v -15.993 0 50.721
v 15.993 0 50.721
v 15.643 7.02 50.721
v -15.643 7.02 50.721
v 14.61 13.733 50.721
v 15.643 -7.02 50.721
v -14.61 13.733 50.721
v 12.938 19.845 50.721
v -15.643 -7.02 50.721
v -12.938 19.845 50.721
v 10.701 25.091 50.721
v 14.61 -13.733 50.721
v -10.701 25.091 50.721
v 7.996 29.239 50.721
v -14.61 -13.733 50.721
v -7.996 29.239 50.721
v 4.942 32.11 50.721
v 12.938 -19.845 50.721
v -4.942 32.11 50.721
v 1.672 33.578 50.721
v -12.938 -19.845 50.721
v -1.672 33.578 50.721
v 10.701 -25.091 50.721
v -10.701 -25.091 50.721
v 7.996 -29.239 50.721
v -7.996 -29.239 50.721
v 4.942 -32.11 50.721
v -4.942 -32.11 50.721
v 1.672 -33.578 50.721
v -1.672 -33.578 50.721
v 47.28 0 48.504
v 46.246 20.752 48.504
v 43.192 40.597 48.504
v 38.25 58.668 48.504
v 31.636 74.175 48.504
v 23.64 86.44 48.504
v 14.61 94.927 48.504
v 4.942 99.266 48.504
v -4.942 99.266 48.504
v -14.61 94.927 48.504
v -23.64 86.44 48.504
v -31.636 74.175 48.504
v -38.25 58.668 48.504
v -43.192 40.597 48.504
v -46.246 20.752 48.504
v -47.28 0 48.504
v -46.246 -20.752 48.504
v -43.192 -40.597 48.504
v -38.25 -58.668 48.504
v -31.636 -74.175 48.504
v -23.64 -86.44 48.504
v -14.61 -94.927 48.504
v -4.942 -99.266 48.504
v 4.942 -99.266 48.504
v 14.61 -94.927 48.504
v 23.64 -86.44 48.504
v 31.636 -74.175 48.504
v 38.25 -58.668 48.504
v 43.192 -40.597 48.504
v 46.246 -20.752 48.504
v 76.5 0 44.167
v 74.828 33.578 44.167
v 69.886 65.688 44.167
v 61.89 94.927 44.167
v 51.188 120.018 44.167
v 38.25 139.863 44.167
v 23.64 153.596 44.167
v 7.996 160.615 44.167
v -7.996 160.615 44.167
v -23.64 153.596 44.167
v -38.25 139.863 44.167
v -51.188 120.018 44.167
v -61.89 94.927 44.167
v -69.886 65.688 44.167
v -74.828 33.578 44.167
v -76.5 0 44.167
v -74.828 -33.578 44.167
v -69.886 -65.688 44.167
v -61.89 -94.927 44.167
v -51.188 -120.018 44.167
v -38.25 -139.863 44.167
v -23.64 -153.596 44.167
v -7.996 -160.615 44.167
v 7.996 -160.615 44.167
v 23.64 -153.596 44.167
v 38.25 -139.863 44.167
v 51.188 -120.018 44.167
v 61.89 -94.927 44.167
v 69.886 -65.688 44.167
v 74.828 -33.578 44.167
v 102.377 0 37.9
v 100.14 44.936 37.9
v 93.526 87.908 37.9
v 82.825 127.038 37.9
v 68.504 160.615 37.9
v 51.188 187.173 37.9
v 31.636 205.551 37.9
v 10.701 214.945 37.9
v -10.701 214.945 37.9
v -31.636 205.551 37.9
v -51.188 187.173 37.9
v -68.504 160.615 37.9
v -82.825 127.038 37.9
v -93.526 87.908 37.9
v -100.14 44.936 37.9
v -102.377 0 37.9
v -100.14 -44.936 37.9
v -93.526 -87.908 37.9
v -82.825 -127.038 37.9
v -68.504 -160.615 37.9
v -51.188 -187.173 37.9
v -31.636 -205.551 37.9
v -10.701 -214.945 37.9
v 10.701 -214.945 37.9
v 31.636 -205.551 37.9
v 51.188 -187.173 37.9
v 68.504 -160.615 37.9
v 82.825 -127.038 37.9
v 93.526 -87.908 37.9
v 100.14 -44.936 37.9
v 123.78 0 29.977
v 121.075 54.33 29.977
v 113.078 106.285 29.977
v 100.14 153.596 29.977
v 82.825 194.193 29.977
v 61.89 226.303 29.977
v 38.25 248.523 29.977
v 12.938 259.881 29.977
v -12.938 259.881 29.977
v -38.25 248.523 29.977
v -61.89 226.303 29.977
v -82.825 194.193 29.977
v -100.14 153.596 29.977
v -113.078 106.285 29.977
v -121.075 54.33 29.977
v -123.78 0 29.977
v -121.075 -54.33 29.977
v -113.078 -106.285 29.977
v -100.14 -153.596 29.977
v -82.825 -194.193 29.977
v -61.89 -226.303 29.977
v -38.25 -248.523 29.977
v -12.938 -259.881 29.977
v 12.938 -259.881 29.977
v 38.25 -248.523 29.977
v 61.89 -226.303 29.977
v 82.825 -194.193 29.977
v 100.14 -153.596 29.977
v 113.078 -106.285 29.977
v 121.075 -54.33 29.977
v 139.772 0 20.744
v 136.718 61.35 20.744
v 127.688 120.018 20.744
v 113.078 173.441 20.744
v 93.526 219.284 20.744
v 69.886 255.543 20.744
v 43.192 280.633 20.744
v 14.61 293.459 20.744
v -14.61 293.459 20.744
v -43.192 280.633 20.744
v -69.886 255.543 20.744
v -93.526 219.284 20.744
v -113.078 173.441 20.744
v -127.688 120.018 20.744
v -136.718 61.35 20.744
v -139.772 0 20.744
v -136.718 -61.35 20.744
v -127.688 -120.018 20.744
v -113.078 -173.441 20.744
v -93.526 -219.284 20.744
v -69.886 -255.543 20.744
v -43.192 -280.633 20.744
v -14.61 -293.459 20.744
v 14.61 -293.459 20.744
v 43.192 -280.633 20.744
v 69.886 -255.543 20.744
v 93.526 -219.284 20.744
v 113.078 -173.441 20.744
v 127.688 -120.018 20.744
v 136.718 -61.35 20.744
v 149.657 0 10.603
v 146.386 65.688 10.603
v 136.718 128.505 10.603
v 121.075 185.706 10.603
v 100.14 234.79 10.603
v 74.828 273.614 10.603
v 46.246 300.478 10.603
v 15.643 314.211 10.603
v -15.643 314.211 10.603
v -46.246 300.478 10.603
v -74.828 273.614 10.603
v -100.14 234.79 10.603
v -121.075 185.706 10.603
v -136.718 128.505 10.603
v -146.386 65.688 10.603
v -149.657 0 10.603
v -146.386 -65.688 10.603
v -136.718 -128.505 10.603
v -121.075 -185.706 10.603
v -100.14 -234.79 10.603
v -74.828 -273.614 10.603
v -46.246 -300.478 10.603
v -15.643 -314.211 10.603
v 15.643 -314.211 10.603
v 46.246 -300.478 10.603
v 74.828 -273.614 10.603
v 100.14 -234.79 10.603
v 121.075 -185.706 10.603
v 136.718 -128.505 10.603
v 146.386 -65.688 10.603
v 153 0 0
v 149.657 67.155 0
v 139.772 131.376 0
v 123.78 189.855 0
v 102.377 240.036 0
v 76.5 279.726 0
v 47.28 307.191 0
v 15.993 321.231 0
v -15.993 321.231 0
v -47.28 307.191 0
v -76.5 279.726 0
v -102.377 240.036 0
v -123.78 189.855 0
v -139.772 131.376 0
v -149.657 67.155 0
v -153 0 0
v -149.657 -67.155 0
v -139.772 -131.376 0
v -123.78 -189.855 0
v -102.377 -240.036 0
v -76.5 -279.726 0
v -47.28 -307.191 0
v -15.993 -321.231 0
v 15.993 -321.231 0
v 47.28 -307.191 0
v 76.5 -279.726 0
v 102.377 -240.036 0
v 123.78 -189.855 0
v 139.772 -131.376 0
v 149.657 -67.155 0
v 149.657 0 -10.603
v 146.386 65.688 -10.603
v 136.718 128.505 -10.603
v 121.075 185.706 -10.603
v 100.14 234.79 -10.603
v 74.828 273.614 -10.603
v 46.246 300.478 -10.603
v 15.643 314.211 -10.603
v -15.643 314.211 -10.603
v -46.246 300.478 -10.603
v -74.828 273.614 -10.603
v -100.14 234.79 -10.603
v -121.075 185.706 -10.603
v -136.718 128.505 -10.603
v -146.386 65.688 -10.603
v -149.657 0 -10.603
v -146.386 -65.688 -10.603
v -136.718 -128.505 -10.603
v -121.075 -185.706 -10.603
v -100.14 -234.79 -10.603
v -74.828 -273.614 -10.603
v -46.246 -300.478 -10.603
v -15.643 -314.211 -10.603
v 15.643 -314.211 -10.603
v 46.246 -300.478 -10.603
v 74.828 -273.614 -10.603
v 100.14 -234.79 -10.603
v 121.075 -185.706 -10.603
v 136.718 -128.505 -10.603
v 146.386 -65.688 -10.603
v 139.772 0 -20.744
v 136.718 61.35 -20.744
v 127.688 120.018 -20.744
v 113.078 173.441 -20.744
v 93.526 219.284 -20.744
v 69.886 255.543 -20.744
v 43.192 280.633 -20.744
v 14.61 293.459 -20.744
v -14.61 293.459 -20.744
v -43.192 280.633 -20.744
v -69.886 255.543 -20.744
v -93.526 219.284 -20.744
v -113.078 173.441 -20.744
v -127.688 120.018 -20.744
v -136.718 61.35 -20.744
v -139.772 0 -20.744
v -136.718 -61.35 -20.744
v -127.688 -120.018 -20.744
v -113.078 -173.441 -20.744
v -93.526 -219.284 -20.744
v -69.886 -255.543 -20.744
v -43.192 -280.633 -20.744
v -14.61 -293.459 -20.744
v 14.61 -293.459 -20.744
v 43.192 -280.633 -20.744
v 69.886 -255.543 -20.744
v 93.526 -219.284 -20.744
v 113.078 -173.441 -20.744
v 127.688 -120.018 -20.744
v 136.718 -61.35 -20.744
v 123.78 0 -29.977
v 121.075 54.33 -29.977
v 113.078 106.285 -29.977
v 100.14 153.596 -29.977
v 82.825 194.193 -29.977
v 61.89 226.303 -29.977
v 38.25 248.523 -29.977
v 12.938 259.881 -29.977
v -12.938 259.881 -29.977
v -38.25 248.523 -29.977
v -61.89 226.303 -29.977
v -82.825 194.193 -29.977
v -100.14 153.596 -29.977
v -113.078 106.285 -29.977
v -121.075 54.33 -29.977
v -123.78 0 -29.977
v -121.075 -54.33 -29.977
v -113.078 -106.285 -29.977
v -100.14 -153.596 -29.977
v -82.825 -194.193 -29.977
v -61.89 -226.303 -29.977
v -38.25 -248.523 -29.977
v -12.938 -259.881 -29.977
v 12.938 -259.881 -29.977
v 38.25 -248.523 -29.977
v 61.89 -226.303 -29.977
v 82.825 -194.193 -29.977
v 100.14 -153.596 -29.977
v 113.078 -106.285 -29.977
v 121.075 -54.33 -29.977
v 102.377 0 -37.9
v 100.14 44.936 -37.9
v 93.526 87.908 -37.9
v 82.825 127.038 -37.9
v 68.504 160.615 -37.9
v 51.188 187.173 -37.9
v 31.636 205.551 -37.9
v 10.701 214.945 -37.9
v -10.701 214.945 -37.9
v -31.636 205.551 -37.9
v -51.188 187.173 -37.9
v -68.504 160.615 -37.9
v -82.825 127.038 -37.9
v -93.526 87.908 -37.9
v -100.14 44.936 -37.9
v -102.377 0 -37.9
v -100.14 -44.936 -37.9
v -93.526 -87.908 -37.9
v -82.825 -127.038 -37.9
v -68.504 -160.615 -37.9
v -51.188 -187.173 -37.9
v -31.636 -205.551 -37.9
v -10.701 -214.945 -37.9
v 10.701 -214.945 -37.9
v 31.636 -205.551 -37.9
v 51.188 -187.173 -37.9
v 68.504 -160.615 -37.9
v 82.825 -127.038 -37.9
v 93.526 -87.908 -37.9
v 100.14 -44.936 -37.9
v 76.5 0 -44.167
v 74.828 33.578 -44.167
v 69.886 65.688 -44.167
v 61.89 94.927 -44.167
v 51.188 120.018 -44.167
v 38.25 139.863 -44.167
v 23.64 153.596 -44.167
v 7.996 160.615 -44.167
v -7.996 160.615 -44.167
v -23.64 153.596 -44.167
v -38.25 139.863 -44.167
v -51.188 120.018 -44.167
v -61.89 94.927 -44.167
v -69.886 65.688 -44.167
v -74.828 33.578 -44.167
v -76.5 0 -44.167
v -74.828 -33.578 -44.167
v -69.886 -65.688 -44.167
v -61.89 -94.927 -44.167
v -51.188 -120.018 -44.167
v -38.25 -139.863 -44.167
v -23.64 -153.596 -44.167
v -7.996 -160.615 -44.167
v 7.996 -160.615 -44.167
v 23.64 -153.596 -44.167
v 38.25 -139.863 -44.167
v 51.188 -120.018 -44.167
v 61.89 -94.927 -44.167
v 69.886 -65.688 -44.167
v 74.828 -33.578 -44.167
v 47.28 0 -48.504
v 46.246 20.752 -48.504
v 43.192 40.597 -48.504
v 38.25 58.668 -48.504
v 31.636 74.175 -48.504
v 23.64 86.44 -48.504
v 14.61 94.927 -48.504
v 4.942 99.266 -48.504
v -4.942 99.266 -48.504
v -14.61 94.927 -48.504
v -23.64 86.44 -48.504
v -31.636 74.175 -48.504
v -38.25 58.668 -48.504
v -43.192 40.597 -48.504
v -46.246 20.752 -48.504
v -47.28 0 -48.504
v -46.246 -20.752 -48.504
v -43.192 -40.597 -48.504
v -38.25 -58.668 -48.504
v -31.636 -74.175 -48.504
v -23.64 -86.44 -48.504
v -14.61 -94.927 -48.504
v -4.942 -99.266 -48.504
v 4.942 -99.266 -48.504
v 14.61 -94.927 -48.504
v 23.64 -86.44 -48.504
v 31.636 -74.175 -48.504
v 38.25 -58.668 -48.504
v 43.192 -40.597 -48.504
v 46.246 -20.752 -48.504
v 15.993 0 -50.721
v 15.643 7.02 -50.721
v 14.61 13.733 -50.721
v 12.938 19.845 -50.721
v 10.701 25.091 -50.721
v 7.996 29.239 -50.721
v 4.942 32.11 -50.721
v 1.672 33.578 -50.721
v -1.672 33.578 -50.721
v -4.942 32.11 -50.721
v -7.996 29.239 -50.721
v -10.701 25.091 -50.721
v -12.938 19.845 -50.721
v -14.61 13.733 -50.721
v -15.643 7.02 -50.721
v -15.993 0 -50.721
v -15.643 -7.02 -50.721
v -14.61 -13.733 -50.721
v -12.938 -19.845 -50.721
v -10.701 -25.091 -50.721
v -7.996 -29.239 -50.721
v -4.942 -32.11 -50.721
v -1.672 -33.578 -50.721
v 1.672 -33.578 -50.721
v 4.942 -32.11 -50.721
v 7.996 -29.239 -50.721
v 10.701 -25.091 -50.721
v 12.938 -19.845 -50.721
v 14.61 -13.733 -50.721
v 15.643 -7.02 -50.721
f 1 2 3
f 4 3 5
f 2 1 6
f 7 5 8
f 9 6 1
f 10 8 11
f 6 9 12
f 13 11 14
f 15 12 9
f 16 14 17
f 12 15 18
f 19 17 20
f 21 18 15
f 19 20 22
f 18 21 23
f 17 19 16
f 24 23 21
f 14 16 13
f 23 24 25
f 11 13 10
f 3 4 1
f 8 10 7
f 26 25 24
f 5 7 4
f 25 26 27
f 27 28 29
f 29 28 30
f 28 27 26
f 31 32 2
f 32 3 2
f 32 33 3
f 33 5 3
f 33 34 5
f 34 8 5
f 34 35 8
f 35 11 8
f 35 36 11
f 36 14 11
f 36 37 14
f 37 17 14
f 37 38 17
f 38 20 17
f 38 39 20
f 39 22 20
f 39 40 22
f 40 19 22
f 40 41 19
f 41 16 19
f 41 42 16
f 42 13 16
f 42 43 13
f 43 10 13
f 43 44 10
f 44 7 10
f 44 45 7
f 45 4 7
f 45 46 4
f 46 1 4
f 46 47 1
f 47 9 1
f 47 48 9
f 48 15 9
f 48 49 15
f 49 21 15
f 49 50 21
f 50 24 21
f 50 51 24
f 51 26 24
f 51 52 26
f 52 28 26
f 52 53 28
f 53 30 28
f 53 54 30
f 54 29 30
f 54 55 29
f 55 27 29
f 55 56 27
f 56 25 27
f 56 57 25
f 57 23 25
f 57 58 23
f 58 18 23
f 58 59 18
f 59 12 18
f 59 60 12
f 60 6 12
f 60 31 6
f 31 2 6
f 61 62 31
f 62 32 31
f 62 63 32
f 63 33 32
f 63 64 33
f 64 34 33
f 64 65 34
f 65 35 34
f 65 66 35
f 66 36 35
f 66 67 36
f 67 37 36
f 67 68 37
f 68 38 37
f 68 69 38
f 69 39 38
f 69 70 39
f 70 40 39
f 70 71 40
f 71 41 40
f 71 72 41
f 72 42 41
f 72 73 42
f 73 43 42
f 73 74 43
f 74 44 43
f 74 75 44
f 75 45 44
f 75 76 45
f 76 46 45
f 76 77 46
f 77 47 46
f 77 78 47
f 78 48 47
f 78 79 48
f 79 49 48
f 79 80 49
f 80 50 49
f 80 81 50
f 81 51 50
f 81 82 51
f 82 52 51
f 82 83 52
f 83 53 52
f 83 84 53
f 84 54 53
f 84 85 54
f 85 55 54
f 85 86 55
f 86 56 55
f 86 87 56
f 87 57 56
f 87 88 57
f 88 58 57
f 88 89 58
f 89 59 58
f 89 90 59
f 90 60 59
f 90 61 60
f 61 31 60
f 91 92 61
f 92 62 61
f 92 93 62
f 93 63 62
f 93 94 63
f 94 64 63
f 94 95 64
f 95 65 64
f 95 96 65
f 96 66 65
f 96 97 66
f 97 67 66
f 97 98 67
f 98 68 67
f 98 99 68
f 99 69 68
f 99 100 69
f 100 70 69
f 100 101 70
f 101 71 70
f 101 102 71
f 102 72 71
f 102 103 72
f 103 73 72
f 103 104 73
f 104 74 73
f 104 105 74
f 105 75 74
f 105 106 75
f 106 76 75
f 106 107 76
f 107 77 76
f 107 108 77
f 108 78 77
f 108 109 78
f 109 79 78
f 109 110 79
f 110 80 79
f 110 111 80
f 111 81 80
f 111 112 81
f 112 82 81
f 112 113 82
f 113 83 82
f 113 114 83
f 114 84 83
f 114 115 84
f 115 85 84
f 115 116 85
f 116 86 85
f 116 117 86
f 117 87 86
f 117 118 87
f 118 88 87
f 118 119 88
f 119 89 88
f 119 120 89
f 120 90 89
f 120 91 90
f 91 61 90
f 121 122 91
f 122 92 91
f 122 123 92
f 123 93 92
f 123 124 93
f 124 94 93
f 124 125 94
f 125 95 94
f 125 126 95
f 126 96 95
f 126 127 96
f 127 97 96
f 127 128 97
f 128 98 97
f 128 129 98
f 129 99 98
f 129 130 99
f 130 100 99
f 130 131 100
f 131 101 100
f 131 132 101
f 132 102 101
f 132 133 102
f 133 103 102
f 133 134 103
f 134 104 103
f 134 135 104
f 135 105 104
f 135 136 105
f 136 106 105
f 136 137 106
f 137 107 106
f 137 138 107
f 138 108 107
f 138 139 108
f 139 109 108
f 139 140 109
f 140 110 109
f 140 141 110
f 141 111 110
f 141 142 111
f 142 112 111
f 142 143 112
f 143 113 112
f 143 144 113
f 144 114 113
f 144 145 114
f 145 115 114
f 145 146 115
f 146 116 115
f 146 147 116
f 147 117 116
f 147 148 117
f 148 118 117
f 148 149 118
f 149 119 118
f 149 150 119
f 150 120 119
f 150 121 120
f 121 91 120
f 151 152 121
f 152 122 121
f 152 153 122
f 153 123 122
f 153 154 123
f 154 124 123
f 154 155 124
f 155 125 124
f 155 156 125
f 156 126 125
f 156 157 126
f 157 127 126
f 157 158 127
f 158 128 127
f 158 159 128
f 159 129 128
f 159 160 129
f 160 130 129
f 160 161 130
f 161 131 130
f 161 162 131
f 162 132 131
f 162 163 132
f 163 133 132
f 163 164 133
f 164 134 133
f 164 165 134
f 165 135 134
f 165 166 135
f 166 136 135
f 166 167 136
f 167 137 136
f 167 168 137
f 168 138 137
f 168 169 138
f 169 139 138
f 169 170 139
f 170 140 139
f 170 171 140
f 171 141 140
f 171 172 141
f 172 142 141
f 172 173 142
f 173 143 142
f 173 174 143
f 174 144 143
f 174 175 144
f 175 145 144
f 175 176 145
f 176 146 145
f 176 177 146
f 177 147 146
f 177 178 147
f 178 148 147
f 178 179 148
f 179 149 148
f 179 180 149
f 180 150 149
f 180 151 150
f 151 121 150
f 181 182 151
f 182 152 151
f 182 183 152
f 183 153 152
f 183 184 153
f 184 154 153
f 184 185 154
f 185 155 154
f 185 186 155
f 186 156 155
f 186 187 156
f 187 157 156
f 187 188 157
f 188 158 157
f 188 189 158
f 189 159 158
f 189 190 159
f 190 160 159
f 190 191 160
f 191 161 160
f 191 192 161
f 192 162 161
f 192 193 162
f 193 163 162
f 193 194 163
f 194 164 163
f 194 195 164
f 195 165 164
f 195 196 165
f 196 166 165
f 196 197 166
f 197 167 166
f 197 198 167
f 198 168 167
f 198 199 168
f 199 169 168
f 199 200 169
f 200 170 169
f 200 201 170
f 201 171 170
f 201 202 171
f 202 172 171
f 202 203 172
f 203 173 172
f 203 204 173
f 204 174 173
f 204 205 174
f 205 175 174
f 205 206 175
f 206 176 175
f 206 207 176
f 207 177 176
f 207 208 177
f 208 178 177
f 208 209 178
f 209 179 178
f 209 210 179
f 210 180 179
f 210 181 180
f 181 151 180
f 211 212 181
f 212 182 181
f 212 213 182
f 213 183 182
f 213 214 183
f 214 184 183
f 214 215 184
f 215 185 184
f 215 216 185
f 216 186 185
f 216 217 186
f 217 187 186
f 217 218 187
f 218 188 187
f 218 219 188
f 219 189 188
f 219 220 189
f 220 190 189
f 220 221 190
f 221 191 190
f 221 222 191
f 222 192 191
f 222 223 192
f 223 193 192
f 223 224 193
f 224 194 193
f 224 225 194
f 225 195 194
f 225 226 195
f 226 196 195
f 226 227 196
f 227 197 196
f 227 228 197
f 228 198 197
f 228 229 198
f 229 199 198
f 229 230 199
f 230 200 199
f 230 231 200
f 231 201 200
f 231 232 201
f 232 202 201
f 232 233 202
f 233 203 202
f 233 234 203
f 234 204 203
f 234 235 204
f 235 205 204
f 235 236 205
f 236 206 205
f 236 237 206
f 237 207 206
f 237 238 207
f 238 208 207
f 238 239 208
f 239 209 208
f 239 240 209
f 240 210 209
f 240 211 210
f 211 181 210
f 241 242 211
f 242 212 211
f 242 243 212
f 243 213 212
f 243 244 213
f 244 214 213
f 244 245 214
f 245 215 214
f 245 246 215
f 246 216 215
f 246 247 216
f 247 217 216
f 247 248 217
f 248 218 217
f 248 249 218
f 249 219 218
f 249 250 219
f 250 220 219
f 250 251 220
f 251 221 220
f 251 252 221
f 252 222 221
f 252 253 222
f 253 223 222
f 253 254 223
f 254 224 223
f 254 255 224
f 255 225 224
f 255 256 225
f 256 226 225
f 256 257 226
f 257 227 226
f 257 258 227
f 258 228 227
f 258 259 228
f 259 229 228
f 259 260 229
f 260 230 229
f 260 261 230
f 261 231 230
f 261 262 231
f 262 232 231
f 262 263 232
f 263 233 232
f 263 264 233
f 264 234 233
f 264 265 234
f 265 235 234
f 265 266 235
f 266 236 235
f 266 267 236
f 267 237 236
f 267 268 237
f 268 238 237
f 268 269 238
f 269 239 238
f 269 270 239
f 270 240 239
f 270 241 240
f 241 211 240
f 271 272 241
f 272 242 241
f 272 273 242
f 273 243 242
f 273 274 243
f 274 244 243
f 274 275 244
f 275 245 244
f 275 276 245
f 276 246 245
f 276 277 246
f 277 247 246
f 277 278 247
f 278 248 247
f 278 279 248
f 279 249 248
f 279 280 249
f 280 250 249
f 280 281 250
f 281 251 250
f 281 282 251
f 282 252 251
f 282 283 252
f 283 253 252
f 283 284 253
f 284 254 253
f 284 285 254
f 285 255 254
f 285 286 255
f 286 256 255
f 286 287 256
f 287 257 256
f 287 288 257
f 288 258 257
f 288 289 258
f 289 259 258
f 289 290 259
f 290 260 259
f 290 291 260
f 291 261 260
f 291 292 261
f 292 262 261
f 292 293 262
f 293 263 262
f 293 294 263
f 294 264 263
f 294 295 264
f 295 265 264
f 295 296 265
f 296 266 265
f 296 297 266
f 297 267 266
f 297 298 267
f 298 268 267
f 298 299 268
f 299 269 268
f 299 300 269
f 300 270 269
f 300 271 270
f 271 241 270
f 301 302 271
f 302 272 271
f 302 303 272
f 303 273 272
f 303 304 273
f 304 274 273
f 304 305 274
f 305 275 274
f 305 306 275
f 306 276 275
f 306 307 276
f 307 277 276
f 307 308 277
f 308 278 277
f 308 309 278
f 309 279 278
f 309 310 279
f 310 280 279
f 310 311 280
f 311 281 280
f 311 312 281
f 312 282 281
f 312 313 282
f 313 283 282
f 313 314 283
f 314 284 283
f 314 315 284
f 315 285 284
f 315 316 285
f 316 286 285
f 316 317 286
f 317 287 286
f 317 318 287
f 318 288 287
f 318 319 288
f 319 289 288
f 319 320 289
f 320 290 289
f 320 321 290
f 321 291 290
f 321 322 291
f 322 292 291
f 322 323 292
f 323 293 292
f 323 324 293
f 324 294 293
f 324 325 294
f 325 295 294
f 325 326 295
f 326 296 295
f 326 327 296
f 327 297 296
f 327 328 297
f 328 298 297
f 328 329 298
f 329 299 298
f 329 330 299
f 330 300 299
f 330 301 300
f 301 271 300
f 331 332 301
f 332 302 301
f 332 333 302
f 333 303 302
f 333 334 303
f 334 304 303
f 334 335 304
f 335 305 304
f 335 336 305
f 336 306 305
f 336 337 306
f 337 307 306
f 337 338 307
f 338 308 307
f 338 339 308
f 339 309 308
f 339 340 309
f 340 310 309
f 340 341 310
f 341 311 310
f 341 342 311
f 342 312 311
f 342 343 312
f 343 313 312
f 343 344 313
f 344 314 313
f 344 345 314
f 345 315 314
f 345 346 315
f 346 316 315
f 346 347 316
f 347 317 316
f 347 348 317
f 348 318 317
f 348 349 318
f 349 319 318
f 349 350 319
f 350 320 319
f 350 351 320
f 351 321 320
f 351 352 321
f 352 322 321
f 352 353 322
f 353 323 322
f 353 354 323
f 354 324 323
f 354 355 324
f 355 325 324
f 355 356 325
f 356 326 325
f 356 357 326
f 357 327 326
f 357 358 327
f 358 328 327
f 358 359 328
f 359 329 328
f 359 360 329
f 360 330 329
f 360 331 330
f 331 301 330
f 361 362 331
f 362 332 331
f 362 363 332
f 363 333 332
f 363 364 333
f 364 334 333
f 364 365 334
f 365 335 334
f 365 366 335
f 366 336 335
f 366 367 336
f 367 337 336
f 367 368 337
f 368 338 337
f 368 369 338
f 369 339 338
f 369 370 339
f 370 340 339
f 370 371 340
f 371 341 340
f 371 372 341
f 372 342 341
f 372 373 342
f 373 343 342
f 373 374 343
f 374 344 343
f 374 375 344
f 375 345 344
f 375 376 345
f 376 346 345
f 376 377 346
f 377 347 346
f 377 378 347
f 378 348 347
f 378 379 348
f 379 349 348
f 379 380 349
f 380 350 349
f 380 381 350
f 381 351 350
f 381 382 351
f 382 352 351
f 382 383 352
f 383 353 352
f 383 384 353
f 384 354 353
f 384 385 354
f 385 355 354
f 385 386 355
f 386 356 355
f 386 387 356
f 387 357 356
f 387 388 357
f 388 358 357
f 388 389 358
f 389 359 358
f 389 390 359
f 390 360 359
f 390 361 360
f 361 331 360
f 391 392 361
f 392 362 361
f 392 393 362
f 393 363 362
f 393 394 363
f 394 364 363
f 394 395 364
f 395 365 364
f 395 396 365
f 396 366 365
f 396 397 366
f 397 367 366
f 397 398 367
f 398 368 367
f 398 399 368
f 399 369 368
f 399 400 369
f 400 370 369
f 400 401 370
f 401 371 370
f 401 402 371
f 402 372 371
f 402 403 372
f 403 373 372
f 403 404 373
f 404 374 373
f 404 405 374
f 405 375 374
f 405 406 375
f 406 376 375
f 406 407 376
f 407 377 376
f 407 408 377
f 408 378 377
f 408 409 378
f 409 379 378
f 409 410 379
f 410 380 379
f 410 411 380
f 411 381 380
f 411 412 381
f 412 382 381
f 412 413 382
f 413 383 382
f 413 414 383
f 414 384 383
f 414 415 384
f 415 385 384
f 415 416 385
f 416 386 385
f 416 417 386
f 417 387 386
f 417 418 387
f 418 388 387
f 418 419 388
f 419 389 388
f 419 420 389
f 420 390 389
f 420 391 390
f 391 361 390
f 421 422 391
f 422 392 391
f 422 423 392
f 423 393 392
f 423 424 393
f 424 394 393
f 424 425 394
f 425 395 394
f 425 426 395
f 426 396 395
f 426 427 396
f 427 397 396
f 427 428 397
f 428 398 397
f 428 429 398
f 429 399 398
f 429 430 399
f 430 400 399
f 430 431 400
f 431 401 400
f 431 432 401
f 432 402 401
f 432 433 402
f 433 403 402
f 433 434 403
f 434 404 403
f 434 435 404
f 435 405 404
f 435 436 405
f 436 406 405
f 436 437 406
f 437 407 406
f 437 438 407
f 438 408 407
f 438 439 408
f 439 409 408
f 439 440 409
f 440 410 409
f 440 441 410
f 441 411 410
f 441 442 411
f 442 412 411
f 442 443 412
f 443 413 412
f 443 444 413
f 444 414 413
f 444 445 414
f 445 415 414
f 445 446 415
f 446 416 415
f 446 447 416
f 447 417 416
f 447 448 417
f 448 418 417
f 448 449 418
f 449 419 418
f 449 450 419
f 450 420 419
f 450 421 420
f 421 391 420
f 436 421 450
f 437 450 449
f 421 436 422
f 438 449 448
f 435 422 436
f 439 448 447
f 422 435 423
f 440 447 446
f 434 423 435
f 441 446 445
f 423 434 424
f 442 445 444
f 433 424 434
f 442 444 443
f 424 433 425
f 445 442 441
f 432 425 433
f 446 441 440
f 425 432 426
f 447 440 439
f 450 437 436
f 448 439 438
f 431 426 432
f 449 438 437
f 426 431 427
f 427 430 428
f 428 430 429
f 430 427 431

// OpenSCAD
// Generated by SolidPython 1.0.1 on 2020-07-29 00:46:49


scale(v = [9, 19, 3]) {
	sphere(r = 17);
}
/***********************************************
*********      SolidPython code:      **********
************************************************
 
# import packages: SolidPython
from solid import *
from solid.utils import *
from itertools import chain, combinations, permutations


class Resize:

    def __init__(self, scad_file):
        self.scad_file = scad_file
        #self.scad_file = import_scad(scad_file)
        # cone/cylinder param:
        self.r1 = 0
        self.r2 = 0
        self.h = 0
        # rectangular prism param:
        self.w = 0
        self.l = 0
        # ellipse param:
        self.r = 0

    # import OpenScad code (file name corresponds to shape)


    # classify shape + parameters
    def assign(self, param1, param2, param3):
        if self.scad_file == 'cone.scad':
            self.r1 = param1
            self.r2 = param2
            self.h = param3
        elif self.scad_file == 'cylinder.scad':
            self.r1 = param1
            self.r2 = param2
            self.h = param3
        elif self.scad_file == 'rectangularPrism.scad':
            self.h = param1
            self.l = param2
            self.w = param3
        else:
            self.r = param1
            self.h = param2

    # resize parameters
    def iterate(self):
        x = range(3, 20, 2)
        i = 1
        if self.scad_file == 'cone.scad':
            tempList = list(permutations(x, 2))
            for temp in tempList:
                param1 = temp[0]
                param2 = temp[1]
                filepath = 'produced_scad_files/' + 'cone' + str(param1) + '_' + str(param2) + '_' + '.scad'
                scad_render_to_file(cylinder(h=param1, r1=param2, r2=0), filepath)

        elif self.scad_file == 'cylinder.scad':
            tempList = list(permutations(x, 3))
            for temp in tempList:
                param1 = temp[0]
                param2 = temp[1]
                filepath = 'produced_scad_files/' + 'cylinder' + str(param1) + '_' + str(param2) + '_' + '.scad'
                scad_render_to_file(cylinder(h=param1, r1=param2, r2=param2), filepath)

        elif self.scad_file == 'rectangularPrism.scad':
            tempList = list(permutations(x, 3))
            for temp in tempList:
                param1 = temp[0]
                param2 = temp[1]
                param3 = temp[2]
                filepath = 'produced_scad_files/' + 'rectangularPrism' + str(param1) + '_' + str(param2) + '_' + str(
                    param3) + '.scad'
                scad_render_to_file(cube(size=(param1, param2, param3)), filepath)

        elif self.scad_file == 'ellipse.scad':
            tempList = list(permutations(x, 4))
            for temp in tempList:
                param1 = temp[0]
                param2 = temp[1]
                param3 = temp[2]
                param4 = temp[3]
                filepath = 'produced_scad_files/' + 'ellipse' + str(param1) + '_' + str(param2) + '_' + str(param3) + '_' + str(param4) + '.scad'
                scad_render_to_file(scale([param1, param2, param3])(sphere(r=param4)), filepath)

    def render_to_scadfile(self):
        scad_render_to_file(scad, 'example.scad') 
 
************************************************/
